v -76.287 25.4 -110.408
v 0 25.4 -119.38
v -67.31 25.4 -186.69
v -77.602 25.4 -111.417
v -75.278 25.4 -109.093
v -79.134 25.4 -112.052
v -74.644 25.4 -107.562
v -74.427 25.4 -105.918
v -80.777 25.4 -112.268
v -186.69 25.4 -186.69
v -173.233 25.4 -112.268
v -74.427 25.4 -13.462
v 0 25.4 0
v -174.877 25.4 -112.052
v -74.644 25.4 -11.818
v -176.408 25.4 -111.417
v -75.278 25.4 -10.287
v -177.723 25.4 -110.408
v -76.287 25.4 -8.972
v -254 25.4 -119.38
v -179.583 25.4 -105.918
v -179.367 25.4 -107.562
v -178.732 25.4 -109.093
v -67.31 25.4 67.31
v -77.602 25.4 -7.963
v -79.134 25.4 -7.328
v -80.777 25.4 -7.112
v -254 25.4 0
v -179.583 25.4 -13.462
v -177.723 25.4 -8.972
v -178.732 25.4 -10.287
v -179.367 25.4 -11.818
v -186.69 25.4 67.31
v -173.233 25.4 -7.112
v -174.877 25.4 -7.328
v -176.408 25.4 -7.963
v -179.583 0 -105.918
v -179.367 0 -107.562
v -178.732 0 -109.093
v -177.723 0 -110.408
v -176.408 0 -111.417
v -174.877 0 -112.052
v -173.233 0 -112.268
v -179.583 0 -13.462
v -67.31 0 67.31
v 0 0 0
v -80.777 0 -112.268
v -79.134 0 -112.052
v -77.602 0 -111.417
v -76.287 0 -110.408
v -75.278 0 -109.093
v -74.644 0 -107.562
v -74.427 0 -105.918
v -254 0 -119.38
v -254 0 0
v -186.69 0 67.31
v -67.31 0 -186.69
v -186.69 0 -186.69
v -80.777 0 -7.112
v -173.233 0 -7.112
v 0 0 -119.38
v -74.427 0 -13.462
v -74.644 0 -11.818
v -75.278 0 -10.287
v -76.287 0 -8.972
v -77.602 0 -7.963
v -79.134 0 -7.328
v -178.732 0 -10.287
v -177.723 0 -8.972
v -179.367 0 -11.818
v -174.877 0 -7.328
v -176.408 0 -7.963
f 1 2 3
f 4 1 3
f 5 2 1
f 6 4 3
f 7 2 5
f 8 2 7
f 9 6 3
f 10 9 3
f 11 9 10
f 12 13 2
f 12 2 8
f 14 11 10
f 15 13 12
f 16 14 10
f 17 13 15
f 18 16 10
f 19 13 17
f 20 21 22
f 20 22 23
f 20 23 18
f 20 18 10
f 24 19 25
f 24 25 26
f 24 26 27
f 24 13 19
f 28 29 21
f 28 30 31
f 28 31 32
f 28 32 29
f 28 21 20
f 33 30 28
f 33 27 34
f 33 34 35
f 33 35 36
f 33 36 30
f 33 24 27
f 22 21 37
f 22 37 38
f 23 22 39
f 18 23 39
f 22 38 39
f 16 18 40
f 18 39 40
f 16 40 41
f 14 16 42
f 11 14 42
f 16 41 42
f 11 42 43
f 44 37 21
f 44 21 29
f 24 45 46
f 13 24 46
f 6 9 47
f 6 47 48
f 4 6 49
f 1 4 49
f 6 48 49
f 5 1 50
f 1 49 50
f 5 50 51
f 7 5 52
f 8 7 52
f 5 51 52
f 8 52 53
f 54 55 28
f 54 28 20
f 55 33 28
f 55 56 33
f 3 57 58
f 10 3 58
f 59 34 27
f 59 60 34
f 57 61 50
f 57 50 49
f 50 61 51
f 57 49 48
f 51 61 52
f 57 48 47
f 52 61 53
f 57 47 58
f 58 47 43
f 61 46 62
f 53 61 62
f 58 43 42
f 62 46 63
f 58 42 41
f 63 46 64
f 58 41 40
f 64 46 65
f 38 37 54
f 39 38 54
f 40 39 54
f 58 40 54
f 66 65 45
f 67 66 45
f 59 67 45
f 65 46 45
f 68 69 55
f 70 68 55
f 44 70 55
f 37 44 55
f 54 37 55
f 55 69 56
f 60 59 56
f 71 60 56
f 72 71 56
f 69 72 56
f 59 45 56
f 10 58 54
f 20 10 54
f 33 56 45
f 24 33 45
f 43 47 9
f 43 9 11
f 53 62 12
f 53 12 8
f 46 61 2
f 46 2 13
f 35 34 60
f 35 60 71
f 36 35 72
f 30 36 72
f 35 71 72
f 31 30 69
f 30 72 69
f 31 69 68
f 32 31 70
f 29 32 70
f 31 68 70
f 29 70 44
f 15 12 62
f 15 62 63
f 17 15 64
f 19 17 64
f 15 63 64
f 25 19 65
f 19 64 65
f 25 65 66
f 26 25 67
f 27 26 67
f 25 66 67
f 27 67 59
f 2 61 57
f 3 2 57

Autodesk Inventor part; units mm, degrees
ref_plane "YZ Plane" through (0, 0, 0) normal (1, 0, 0) x (0, 1, 0)
ref_plane "XZ Plane" through (0, 0, 0) normal (0, 1, 0) x (-1, 0, 0)
ref_plane "XY Plane" through (0, 0, 0) normal (0, 0, 1) x (1, 0, 0)
sketch "Sketch1" plane through (0, 0, 0) normal (0, 1, 0) x (-1, 0, 0)
  line L0 (0, 0) -> (254, 0)
  line L1 (254, 0) -> (254, -119.38)
  line L2 (254, -119.38) -> (0, -119.38)
  line L3 (0, -119.38) -> (0, 0)
  line L4 (186.69, 67.31) -> (67.31, 67.31)
  line L5 (67.31, 67.31) -> (67.31, -186.69)
  line L6 (67.31, -186.69) -> (186.69, -186.69)
  line L7 (186.69, -186.69) -> (186.69, 67.31)
  line L8 (186.69, 67.31) -> (254, 0)
  line L9 (67.31, 67.31) -> (0, 0)
  line L10 (186.69, -186.69) -> (254, -119.38)
  line L11 (0, -119.38) -> (67.31, -186.69)
  line L12 (62.2907, -7.1202) -> (161.0967, -7.1202)
  line L13 (164.2717, -10.2952) -> (164.2717, -109.1012)
  line L14 (161.0967, -112.2762) -> (62.2907, -112.2762)
  line L15 (59.1157, -109.1012) -> (59.1157, -10.2952)
  arc A0 (62.2907, -7.1202) -> (59.1157, -10.2952) centre (62.2907, -10.2952) ccw
  arc A1 (164.2717, -10.2952) -> (161.0967, -7.1202) centre (161.0967, -10.2952) ccw
  arc A2 (161.0967, -112.2762) -> (164.2717, -109.1012) centre (161.0967, -109.1012) ccw
  arc A3 (59.1157, -109.1012) -> (62.2907, -112.2762) centre (62.2907, -109.1012) ccw
  line L16 (254, -119.38) -> (127, -119.38)
  line L17 (126.9917, -59.69) -> (127, -119.38)
  point P0 (164.2717, -112.2762)
  point P1 (164.2717, -7.1202)
  point P2 (59.1157, -112.2762)
  point P3 (127, -59.69)
  point P4 (127, -59.69)
  dimension "d0" = 254
  dimension "d1" = 119.38
  dimension "d2" = 119.38
  dimension "d3" = 254
  dimension "d8" = 95.1907
  dimension "d14" = 105.156
  dimension "d15" = 105.156
  dimension "d22" = 3.175
  dimension "d50" = 127
  dimension "d51" = 59.69
extrude "Extrusion1" add sketch "Sketch1" along normal blind 25.4
sketch "Sketch3" plane through (0, 0, 0) normal (0, -1, 0) x (1, 0, 0)
  line L0 (-80.7772, -112.268) -> (-173.2332, -112.268)
  line L1 (-179.5832, -105.918) -> (-179.5832, -13.462)
  line L2 (-173.2332, -7.112) -> (-80.7772, -7.112)
  line L3 (-74.4272, -13.462) -> (-74.4272, -105.918)
  arc A0 (-80.7772, -112.268) -> (-74.4272, -105.918) centre (-80.7772, -105.918) ccw
  arc A1 (-179.5832, -105.918) -> (-173.2332, -112.268) centre (-173.2332, -105.918) ccw
  arc A2 (-173.2332, -7.112) -> (-179.5832, -13.462) centre (-173.2332, -13.462) ccw
  arc A3 (-74.4272, -13.462) -> (-80.7772, -7.112) centre (-80.7772, -13.462) ccw
  line L4 (-124.213, 67.31) -> (-124.213, -7.112)
  line L5 (-254.0007, -58.0211) -> (-179.5787, -58.0211)
  line L6 (-186.69, 67.31) -> (-67.31, 67.31) projected
  point P0 (0, 0)
  point P1 (-179.5832, -7.112)
  point P2 (-179.5832, -112.268)
  point P3 (-74.4272, -7.112)
  point P4 (-179.5832, -58.0211)
  dimension "d23" = 105.156
  dimension "d24" = 105.156
  dimension "d42" = 6.35
  dimension "d45" = 74.422
  dimension "d46" = 74.422
extrude "Extrusion2" cut sketch "Sketch3" against normal blind 25.4
equation "\"d0\" = rectangle_L"
equation "\"d1\" = rectangle_01_w"
equation "\"d2\" = rectangle_01_w"
equation "\"d3\" = rectangle_L"
equation "\"d8\" = d9"
equation "\"d14\" = window_L"
equation "\"d15\" = window_L"
equation "\"rectangle_L\" = 254"
equation "\"rectangle_01_w\" = 119.38"
equation "\"d9\" = 95.19071"
equation "\"window_L\" = 105.156"
equation "\"test\" = 74.422"
equation "\"d47\" = 74.422"
equation "\"d48\" = 254"
equation "\"d49\" = 105.156"
equation "\"dot_pos\" = 127"
equation "\"dot_pos_2\" = 59.69"
properties part number "chamber_top"
